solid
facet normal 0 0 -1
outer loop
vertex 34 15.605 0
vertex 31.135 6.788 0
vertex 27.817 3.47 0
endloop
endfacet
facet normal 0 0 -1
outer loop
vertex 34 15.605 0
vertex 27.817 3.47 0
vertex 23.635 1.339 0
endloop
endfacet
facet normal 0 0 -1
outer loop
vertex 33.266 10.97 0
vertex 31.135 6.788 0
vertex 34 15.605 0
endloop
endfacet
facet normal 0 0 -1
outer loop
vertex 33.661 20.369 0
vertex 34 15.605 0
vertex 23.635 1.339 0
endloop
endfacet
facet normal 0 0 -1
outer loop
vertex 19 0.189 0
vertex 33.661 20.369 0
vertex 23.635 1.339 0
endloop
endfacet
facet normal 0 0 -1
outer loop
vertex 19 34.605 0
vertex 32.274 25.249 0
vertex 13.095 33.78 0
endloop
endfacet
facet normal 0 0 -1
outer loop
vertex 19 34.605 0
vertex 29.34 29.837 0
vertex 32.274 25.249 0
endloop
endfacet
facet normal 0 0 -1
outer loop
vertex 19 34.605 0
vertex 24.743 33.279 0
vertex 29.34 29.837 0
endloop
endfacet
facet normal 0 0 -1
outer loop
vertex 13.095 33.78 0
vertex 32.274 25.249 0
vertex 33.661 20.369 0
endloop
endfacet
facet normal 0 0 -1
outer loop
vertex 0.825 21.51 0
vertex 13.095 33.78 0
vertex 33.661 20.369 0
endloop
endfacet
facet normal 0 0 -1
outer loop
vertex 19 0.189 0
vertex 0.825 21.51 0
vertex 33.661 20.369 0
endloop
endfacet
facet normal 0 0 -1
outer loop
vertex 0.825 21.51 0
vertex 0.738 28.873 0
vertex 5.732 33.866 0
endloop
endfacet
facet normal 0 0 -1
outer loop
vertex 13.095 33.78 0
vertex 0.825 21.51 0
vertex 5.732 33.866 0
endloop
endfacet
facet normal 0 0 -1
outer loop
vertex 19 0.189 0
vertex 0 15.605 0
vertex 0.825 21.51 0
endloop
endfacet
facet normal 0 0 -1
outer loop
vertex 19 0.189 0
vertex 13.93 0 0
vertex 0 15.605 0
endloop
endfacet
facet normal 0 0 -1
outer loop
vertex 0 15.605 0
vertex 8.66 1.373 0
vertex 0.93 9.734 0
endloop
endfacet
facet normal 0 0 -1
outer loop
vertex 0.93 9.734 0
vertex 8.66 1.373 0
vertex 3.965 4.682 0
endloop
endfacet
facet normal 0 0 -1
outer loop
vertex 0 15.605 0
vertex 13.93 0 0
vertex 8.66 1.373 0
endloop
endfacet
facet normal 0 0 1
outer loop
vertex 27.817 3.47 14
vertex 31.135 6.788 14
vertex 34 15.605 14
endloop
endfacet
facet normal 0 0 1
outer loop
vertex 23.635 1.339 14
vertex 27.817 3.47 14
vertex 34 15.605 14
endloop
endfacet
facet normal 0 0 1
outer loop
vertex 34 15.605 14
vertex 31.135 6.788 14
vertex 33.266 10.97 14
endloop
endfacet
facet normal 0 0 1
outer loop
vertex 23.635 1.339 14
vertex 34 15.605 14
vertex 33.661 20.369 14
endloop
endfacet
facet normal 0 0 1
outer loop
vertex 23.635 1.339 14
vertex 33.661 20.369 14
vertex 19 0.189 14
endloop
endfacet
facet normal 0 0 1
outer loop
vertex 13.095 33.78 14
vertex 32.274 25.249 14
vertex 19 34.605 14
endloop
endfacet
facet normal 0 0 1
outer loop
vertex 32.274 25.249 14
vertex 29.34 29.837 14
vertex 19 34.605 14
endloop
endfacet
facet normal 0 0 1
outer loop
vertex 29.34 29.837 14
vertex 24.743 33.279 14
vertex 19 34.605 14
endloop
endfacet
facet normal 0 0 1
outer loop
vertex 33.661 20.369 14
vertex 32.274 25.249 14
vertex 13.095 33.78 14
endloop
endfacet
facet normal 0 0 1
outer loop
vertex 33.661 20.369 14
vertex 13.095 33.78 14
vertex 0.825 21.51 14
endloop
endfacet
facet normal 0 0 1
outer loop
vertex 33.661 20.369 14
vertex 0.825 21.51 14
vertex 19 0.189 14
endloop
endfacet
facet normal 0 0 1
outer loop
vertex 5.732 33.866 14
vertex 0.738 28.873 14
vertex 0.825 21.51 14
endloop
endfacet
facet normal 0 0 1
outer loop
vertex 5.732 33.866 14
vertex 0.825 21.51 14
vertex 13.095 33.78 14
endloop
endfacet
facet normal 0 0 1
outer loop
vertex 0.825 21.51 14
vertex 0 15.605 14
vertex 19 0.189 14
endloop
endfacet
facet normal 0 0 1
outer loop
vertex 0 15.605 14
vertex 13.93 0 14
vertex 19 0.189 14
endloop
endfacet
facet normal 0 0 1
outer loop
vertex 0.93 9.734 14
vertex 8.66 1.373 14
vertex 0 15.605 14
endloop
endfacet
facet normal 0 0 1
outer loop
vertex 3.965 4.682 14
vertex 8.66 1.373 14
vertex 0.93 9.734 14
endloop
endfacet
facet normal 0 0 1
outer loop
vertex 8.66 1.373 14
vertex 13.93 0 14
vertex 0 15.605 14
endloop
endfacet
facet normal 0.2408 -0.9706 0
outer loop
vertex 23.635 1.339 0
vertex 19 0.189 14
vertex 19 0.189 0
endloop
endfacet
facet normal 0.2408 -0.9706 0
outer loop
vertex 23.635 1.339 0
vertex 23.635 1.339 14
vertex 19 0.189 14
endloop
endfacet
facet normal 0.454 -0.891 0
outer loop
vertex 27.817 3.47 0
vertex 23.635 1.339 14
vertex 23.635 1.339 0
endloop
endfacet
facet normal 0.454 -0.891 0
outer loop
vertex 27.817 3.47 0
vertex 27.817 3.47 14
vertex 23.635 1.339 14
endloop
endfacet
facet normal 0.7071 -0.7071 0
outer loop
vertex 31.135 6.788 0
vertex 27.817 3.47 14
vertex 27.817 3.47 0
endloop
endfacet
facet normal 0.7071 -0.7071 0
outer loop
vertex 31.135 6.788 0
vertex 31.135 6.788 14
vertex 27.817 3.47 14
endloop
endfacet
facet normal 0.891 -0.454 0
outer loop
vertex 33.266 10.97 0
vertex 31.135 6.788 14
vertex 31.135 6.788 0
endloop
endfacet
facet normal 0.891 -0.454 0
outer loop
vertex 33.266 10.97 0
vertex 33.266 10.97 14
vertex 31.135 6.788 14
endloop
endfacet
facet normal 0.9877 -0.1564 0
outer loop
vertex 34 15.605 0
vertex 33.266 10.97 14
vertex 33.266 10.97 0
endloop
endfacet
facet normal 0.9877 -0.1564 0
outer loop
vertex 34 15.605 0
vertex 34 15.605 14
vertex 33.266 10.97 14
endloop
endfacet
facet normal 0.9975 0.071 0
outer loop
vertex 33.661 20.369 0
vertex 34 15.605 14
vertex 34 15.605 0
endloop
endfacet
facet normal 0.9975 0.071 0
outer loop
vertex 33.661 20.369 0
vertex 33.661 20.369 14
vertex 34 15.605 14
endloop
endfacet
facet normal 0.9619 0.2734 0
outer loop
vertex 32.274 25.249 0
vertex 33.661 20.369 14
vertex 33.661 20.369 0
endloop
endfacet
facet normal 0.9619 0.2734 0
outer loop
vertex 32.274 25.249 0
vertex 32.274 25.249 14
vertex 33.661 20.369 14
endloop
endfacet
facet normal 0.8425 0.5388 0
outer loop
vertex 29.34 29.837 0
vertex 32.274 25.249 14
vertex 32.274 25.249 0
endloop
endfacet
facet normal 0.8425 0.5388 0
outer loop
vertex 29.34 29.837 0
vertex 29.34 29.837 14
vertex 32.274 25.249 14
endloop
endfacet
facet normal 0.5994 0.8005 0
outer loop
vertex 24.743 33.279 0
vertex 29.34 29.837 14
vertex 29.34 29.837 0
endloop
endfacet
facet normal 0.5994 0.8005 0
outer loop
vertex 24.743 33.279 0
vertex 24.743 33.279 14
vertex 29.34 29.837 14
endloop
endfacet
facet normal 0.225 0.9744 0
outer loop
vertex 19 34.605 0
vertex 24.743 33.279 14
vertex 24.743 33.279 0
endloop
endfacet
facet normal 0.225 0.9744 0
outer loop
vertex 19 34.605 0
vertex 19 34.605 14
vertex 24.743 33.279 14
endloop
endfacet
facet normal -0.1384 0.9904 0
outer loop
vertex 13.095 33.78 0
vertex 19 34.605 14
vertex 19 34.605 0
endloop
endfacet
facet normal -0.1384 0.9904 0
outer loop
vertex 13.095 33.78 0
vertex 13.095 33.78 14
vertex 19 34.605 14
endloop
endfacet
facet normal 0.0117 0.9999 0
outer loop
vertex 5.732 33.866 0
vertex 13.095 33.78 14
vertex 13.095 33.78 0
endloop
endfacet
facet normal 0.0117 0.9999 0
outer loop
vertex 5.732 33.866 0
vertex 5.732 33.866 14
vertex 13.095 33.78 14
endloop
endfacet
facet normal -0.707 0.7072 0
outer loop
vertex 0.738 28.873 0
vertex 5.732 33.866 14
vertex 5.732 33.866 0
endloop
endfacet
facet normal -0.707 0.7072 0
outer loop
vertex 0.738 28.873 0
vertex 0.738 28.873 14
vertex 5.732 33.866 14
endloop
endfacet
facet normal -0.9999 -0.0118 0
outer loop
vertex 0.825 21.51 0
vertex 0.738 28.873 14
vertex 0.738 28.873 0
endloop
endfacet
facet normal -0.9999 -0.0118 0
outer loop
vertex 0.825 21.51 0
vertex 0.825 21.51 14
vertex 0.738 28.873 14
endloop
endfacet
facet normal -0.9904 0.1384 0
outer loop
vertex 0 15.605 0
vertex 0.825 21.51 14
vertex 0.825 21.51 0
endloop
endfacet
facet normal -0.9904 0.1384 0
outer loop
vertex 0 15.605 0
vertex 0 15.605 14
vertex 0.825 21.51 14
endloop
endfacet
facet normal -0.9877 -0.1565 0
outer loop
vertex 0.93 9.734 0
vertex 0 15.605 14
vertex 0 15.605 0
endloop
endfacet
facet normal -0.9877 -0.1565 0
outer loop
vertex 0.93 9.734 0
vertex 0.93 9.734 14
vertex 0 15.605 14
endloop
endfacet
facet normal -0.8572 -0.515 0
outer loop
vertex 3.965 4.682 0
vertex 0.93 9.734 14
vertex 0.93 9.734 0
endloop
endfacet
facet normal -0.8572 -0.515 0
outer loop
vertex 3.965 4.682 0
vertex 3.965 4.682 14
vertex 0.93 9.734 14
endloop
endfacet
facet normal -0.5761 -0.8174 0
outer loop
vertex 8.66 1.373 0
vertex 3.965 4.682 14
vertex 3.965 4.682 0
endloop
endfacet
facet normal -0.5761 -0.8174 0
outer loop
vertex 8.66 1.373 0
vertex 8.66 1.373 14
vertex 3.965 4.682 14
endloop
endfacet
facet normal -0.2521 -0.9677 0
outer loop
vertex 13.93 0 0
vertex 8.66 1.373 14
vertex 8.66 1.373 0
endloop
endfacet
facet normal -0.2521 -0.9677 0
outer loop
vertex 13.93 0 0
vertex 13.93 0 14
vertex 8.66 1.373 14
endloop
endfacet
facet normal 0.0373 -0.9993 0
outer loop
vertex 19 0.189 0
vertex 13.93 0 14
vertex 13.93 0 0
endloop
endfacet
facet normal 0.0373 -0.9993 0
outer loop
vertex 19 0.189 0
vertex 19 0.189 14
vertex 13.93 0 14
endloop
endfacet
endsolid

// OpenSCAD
$fn = 32;

// ----------------------------------------------------------------------
// Cam disc: base radius 15.0 mm, lift 4.0 mm, 20 profile points
// ----------------------------------------------------------------------

// --- parameters (mm) ---
profile_height = 14;      // extrusion height
profile_points = 20;      // points of the closed outline

profile = [[34, 15.605], [33.661, 20.369], [32.274, 25.249], [29.34, 29.837], [24.743, 33.279], [19, 34.605], [13.095, 33.78], [5.732, 33.866], [0.738, 28.873], [0.825, 21.51], [0, 15.605], [0.93, 9.734], [3.965, 4.682], [8.66, 1.373], [13.93, 0], [19, 0.189], [23.635, 1.339], [27.817, 3.47], [31.135, 6.788], [33.266, 10.97]];  // single closed polygon, 20 points, counter clockwise

// --- the one profile operation ---
linear_extrude(height = profile_height) polygon(points = profile);
